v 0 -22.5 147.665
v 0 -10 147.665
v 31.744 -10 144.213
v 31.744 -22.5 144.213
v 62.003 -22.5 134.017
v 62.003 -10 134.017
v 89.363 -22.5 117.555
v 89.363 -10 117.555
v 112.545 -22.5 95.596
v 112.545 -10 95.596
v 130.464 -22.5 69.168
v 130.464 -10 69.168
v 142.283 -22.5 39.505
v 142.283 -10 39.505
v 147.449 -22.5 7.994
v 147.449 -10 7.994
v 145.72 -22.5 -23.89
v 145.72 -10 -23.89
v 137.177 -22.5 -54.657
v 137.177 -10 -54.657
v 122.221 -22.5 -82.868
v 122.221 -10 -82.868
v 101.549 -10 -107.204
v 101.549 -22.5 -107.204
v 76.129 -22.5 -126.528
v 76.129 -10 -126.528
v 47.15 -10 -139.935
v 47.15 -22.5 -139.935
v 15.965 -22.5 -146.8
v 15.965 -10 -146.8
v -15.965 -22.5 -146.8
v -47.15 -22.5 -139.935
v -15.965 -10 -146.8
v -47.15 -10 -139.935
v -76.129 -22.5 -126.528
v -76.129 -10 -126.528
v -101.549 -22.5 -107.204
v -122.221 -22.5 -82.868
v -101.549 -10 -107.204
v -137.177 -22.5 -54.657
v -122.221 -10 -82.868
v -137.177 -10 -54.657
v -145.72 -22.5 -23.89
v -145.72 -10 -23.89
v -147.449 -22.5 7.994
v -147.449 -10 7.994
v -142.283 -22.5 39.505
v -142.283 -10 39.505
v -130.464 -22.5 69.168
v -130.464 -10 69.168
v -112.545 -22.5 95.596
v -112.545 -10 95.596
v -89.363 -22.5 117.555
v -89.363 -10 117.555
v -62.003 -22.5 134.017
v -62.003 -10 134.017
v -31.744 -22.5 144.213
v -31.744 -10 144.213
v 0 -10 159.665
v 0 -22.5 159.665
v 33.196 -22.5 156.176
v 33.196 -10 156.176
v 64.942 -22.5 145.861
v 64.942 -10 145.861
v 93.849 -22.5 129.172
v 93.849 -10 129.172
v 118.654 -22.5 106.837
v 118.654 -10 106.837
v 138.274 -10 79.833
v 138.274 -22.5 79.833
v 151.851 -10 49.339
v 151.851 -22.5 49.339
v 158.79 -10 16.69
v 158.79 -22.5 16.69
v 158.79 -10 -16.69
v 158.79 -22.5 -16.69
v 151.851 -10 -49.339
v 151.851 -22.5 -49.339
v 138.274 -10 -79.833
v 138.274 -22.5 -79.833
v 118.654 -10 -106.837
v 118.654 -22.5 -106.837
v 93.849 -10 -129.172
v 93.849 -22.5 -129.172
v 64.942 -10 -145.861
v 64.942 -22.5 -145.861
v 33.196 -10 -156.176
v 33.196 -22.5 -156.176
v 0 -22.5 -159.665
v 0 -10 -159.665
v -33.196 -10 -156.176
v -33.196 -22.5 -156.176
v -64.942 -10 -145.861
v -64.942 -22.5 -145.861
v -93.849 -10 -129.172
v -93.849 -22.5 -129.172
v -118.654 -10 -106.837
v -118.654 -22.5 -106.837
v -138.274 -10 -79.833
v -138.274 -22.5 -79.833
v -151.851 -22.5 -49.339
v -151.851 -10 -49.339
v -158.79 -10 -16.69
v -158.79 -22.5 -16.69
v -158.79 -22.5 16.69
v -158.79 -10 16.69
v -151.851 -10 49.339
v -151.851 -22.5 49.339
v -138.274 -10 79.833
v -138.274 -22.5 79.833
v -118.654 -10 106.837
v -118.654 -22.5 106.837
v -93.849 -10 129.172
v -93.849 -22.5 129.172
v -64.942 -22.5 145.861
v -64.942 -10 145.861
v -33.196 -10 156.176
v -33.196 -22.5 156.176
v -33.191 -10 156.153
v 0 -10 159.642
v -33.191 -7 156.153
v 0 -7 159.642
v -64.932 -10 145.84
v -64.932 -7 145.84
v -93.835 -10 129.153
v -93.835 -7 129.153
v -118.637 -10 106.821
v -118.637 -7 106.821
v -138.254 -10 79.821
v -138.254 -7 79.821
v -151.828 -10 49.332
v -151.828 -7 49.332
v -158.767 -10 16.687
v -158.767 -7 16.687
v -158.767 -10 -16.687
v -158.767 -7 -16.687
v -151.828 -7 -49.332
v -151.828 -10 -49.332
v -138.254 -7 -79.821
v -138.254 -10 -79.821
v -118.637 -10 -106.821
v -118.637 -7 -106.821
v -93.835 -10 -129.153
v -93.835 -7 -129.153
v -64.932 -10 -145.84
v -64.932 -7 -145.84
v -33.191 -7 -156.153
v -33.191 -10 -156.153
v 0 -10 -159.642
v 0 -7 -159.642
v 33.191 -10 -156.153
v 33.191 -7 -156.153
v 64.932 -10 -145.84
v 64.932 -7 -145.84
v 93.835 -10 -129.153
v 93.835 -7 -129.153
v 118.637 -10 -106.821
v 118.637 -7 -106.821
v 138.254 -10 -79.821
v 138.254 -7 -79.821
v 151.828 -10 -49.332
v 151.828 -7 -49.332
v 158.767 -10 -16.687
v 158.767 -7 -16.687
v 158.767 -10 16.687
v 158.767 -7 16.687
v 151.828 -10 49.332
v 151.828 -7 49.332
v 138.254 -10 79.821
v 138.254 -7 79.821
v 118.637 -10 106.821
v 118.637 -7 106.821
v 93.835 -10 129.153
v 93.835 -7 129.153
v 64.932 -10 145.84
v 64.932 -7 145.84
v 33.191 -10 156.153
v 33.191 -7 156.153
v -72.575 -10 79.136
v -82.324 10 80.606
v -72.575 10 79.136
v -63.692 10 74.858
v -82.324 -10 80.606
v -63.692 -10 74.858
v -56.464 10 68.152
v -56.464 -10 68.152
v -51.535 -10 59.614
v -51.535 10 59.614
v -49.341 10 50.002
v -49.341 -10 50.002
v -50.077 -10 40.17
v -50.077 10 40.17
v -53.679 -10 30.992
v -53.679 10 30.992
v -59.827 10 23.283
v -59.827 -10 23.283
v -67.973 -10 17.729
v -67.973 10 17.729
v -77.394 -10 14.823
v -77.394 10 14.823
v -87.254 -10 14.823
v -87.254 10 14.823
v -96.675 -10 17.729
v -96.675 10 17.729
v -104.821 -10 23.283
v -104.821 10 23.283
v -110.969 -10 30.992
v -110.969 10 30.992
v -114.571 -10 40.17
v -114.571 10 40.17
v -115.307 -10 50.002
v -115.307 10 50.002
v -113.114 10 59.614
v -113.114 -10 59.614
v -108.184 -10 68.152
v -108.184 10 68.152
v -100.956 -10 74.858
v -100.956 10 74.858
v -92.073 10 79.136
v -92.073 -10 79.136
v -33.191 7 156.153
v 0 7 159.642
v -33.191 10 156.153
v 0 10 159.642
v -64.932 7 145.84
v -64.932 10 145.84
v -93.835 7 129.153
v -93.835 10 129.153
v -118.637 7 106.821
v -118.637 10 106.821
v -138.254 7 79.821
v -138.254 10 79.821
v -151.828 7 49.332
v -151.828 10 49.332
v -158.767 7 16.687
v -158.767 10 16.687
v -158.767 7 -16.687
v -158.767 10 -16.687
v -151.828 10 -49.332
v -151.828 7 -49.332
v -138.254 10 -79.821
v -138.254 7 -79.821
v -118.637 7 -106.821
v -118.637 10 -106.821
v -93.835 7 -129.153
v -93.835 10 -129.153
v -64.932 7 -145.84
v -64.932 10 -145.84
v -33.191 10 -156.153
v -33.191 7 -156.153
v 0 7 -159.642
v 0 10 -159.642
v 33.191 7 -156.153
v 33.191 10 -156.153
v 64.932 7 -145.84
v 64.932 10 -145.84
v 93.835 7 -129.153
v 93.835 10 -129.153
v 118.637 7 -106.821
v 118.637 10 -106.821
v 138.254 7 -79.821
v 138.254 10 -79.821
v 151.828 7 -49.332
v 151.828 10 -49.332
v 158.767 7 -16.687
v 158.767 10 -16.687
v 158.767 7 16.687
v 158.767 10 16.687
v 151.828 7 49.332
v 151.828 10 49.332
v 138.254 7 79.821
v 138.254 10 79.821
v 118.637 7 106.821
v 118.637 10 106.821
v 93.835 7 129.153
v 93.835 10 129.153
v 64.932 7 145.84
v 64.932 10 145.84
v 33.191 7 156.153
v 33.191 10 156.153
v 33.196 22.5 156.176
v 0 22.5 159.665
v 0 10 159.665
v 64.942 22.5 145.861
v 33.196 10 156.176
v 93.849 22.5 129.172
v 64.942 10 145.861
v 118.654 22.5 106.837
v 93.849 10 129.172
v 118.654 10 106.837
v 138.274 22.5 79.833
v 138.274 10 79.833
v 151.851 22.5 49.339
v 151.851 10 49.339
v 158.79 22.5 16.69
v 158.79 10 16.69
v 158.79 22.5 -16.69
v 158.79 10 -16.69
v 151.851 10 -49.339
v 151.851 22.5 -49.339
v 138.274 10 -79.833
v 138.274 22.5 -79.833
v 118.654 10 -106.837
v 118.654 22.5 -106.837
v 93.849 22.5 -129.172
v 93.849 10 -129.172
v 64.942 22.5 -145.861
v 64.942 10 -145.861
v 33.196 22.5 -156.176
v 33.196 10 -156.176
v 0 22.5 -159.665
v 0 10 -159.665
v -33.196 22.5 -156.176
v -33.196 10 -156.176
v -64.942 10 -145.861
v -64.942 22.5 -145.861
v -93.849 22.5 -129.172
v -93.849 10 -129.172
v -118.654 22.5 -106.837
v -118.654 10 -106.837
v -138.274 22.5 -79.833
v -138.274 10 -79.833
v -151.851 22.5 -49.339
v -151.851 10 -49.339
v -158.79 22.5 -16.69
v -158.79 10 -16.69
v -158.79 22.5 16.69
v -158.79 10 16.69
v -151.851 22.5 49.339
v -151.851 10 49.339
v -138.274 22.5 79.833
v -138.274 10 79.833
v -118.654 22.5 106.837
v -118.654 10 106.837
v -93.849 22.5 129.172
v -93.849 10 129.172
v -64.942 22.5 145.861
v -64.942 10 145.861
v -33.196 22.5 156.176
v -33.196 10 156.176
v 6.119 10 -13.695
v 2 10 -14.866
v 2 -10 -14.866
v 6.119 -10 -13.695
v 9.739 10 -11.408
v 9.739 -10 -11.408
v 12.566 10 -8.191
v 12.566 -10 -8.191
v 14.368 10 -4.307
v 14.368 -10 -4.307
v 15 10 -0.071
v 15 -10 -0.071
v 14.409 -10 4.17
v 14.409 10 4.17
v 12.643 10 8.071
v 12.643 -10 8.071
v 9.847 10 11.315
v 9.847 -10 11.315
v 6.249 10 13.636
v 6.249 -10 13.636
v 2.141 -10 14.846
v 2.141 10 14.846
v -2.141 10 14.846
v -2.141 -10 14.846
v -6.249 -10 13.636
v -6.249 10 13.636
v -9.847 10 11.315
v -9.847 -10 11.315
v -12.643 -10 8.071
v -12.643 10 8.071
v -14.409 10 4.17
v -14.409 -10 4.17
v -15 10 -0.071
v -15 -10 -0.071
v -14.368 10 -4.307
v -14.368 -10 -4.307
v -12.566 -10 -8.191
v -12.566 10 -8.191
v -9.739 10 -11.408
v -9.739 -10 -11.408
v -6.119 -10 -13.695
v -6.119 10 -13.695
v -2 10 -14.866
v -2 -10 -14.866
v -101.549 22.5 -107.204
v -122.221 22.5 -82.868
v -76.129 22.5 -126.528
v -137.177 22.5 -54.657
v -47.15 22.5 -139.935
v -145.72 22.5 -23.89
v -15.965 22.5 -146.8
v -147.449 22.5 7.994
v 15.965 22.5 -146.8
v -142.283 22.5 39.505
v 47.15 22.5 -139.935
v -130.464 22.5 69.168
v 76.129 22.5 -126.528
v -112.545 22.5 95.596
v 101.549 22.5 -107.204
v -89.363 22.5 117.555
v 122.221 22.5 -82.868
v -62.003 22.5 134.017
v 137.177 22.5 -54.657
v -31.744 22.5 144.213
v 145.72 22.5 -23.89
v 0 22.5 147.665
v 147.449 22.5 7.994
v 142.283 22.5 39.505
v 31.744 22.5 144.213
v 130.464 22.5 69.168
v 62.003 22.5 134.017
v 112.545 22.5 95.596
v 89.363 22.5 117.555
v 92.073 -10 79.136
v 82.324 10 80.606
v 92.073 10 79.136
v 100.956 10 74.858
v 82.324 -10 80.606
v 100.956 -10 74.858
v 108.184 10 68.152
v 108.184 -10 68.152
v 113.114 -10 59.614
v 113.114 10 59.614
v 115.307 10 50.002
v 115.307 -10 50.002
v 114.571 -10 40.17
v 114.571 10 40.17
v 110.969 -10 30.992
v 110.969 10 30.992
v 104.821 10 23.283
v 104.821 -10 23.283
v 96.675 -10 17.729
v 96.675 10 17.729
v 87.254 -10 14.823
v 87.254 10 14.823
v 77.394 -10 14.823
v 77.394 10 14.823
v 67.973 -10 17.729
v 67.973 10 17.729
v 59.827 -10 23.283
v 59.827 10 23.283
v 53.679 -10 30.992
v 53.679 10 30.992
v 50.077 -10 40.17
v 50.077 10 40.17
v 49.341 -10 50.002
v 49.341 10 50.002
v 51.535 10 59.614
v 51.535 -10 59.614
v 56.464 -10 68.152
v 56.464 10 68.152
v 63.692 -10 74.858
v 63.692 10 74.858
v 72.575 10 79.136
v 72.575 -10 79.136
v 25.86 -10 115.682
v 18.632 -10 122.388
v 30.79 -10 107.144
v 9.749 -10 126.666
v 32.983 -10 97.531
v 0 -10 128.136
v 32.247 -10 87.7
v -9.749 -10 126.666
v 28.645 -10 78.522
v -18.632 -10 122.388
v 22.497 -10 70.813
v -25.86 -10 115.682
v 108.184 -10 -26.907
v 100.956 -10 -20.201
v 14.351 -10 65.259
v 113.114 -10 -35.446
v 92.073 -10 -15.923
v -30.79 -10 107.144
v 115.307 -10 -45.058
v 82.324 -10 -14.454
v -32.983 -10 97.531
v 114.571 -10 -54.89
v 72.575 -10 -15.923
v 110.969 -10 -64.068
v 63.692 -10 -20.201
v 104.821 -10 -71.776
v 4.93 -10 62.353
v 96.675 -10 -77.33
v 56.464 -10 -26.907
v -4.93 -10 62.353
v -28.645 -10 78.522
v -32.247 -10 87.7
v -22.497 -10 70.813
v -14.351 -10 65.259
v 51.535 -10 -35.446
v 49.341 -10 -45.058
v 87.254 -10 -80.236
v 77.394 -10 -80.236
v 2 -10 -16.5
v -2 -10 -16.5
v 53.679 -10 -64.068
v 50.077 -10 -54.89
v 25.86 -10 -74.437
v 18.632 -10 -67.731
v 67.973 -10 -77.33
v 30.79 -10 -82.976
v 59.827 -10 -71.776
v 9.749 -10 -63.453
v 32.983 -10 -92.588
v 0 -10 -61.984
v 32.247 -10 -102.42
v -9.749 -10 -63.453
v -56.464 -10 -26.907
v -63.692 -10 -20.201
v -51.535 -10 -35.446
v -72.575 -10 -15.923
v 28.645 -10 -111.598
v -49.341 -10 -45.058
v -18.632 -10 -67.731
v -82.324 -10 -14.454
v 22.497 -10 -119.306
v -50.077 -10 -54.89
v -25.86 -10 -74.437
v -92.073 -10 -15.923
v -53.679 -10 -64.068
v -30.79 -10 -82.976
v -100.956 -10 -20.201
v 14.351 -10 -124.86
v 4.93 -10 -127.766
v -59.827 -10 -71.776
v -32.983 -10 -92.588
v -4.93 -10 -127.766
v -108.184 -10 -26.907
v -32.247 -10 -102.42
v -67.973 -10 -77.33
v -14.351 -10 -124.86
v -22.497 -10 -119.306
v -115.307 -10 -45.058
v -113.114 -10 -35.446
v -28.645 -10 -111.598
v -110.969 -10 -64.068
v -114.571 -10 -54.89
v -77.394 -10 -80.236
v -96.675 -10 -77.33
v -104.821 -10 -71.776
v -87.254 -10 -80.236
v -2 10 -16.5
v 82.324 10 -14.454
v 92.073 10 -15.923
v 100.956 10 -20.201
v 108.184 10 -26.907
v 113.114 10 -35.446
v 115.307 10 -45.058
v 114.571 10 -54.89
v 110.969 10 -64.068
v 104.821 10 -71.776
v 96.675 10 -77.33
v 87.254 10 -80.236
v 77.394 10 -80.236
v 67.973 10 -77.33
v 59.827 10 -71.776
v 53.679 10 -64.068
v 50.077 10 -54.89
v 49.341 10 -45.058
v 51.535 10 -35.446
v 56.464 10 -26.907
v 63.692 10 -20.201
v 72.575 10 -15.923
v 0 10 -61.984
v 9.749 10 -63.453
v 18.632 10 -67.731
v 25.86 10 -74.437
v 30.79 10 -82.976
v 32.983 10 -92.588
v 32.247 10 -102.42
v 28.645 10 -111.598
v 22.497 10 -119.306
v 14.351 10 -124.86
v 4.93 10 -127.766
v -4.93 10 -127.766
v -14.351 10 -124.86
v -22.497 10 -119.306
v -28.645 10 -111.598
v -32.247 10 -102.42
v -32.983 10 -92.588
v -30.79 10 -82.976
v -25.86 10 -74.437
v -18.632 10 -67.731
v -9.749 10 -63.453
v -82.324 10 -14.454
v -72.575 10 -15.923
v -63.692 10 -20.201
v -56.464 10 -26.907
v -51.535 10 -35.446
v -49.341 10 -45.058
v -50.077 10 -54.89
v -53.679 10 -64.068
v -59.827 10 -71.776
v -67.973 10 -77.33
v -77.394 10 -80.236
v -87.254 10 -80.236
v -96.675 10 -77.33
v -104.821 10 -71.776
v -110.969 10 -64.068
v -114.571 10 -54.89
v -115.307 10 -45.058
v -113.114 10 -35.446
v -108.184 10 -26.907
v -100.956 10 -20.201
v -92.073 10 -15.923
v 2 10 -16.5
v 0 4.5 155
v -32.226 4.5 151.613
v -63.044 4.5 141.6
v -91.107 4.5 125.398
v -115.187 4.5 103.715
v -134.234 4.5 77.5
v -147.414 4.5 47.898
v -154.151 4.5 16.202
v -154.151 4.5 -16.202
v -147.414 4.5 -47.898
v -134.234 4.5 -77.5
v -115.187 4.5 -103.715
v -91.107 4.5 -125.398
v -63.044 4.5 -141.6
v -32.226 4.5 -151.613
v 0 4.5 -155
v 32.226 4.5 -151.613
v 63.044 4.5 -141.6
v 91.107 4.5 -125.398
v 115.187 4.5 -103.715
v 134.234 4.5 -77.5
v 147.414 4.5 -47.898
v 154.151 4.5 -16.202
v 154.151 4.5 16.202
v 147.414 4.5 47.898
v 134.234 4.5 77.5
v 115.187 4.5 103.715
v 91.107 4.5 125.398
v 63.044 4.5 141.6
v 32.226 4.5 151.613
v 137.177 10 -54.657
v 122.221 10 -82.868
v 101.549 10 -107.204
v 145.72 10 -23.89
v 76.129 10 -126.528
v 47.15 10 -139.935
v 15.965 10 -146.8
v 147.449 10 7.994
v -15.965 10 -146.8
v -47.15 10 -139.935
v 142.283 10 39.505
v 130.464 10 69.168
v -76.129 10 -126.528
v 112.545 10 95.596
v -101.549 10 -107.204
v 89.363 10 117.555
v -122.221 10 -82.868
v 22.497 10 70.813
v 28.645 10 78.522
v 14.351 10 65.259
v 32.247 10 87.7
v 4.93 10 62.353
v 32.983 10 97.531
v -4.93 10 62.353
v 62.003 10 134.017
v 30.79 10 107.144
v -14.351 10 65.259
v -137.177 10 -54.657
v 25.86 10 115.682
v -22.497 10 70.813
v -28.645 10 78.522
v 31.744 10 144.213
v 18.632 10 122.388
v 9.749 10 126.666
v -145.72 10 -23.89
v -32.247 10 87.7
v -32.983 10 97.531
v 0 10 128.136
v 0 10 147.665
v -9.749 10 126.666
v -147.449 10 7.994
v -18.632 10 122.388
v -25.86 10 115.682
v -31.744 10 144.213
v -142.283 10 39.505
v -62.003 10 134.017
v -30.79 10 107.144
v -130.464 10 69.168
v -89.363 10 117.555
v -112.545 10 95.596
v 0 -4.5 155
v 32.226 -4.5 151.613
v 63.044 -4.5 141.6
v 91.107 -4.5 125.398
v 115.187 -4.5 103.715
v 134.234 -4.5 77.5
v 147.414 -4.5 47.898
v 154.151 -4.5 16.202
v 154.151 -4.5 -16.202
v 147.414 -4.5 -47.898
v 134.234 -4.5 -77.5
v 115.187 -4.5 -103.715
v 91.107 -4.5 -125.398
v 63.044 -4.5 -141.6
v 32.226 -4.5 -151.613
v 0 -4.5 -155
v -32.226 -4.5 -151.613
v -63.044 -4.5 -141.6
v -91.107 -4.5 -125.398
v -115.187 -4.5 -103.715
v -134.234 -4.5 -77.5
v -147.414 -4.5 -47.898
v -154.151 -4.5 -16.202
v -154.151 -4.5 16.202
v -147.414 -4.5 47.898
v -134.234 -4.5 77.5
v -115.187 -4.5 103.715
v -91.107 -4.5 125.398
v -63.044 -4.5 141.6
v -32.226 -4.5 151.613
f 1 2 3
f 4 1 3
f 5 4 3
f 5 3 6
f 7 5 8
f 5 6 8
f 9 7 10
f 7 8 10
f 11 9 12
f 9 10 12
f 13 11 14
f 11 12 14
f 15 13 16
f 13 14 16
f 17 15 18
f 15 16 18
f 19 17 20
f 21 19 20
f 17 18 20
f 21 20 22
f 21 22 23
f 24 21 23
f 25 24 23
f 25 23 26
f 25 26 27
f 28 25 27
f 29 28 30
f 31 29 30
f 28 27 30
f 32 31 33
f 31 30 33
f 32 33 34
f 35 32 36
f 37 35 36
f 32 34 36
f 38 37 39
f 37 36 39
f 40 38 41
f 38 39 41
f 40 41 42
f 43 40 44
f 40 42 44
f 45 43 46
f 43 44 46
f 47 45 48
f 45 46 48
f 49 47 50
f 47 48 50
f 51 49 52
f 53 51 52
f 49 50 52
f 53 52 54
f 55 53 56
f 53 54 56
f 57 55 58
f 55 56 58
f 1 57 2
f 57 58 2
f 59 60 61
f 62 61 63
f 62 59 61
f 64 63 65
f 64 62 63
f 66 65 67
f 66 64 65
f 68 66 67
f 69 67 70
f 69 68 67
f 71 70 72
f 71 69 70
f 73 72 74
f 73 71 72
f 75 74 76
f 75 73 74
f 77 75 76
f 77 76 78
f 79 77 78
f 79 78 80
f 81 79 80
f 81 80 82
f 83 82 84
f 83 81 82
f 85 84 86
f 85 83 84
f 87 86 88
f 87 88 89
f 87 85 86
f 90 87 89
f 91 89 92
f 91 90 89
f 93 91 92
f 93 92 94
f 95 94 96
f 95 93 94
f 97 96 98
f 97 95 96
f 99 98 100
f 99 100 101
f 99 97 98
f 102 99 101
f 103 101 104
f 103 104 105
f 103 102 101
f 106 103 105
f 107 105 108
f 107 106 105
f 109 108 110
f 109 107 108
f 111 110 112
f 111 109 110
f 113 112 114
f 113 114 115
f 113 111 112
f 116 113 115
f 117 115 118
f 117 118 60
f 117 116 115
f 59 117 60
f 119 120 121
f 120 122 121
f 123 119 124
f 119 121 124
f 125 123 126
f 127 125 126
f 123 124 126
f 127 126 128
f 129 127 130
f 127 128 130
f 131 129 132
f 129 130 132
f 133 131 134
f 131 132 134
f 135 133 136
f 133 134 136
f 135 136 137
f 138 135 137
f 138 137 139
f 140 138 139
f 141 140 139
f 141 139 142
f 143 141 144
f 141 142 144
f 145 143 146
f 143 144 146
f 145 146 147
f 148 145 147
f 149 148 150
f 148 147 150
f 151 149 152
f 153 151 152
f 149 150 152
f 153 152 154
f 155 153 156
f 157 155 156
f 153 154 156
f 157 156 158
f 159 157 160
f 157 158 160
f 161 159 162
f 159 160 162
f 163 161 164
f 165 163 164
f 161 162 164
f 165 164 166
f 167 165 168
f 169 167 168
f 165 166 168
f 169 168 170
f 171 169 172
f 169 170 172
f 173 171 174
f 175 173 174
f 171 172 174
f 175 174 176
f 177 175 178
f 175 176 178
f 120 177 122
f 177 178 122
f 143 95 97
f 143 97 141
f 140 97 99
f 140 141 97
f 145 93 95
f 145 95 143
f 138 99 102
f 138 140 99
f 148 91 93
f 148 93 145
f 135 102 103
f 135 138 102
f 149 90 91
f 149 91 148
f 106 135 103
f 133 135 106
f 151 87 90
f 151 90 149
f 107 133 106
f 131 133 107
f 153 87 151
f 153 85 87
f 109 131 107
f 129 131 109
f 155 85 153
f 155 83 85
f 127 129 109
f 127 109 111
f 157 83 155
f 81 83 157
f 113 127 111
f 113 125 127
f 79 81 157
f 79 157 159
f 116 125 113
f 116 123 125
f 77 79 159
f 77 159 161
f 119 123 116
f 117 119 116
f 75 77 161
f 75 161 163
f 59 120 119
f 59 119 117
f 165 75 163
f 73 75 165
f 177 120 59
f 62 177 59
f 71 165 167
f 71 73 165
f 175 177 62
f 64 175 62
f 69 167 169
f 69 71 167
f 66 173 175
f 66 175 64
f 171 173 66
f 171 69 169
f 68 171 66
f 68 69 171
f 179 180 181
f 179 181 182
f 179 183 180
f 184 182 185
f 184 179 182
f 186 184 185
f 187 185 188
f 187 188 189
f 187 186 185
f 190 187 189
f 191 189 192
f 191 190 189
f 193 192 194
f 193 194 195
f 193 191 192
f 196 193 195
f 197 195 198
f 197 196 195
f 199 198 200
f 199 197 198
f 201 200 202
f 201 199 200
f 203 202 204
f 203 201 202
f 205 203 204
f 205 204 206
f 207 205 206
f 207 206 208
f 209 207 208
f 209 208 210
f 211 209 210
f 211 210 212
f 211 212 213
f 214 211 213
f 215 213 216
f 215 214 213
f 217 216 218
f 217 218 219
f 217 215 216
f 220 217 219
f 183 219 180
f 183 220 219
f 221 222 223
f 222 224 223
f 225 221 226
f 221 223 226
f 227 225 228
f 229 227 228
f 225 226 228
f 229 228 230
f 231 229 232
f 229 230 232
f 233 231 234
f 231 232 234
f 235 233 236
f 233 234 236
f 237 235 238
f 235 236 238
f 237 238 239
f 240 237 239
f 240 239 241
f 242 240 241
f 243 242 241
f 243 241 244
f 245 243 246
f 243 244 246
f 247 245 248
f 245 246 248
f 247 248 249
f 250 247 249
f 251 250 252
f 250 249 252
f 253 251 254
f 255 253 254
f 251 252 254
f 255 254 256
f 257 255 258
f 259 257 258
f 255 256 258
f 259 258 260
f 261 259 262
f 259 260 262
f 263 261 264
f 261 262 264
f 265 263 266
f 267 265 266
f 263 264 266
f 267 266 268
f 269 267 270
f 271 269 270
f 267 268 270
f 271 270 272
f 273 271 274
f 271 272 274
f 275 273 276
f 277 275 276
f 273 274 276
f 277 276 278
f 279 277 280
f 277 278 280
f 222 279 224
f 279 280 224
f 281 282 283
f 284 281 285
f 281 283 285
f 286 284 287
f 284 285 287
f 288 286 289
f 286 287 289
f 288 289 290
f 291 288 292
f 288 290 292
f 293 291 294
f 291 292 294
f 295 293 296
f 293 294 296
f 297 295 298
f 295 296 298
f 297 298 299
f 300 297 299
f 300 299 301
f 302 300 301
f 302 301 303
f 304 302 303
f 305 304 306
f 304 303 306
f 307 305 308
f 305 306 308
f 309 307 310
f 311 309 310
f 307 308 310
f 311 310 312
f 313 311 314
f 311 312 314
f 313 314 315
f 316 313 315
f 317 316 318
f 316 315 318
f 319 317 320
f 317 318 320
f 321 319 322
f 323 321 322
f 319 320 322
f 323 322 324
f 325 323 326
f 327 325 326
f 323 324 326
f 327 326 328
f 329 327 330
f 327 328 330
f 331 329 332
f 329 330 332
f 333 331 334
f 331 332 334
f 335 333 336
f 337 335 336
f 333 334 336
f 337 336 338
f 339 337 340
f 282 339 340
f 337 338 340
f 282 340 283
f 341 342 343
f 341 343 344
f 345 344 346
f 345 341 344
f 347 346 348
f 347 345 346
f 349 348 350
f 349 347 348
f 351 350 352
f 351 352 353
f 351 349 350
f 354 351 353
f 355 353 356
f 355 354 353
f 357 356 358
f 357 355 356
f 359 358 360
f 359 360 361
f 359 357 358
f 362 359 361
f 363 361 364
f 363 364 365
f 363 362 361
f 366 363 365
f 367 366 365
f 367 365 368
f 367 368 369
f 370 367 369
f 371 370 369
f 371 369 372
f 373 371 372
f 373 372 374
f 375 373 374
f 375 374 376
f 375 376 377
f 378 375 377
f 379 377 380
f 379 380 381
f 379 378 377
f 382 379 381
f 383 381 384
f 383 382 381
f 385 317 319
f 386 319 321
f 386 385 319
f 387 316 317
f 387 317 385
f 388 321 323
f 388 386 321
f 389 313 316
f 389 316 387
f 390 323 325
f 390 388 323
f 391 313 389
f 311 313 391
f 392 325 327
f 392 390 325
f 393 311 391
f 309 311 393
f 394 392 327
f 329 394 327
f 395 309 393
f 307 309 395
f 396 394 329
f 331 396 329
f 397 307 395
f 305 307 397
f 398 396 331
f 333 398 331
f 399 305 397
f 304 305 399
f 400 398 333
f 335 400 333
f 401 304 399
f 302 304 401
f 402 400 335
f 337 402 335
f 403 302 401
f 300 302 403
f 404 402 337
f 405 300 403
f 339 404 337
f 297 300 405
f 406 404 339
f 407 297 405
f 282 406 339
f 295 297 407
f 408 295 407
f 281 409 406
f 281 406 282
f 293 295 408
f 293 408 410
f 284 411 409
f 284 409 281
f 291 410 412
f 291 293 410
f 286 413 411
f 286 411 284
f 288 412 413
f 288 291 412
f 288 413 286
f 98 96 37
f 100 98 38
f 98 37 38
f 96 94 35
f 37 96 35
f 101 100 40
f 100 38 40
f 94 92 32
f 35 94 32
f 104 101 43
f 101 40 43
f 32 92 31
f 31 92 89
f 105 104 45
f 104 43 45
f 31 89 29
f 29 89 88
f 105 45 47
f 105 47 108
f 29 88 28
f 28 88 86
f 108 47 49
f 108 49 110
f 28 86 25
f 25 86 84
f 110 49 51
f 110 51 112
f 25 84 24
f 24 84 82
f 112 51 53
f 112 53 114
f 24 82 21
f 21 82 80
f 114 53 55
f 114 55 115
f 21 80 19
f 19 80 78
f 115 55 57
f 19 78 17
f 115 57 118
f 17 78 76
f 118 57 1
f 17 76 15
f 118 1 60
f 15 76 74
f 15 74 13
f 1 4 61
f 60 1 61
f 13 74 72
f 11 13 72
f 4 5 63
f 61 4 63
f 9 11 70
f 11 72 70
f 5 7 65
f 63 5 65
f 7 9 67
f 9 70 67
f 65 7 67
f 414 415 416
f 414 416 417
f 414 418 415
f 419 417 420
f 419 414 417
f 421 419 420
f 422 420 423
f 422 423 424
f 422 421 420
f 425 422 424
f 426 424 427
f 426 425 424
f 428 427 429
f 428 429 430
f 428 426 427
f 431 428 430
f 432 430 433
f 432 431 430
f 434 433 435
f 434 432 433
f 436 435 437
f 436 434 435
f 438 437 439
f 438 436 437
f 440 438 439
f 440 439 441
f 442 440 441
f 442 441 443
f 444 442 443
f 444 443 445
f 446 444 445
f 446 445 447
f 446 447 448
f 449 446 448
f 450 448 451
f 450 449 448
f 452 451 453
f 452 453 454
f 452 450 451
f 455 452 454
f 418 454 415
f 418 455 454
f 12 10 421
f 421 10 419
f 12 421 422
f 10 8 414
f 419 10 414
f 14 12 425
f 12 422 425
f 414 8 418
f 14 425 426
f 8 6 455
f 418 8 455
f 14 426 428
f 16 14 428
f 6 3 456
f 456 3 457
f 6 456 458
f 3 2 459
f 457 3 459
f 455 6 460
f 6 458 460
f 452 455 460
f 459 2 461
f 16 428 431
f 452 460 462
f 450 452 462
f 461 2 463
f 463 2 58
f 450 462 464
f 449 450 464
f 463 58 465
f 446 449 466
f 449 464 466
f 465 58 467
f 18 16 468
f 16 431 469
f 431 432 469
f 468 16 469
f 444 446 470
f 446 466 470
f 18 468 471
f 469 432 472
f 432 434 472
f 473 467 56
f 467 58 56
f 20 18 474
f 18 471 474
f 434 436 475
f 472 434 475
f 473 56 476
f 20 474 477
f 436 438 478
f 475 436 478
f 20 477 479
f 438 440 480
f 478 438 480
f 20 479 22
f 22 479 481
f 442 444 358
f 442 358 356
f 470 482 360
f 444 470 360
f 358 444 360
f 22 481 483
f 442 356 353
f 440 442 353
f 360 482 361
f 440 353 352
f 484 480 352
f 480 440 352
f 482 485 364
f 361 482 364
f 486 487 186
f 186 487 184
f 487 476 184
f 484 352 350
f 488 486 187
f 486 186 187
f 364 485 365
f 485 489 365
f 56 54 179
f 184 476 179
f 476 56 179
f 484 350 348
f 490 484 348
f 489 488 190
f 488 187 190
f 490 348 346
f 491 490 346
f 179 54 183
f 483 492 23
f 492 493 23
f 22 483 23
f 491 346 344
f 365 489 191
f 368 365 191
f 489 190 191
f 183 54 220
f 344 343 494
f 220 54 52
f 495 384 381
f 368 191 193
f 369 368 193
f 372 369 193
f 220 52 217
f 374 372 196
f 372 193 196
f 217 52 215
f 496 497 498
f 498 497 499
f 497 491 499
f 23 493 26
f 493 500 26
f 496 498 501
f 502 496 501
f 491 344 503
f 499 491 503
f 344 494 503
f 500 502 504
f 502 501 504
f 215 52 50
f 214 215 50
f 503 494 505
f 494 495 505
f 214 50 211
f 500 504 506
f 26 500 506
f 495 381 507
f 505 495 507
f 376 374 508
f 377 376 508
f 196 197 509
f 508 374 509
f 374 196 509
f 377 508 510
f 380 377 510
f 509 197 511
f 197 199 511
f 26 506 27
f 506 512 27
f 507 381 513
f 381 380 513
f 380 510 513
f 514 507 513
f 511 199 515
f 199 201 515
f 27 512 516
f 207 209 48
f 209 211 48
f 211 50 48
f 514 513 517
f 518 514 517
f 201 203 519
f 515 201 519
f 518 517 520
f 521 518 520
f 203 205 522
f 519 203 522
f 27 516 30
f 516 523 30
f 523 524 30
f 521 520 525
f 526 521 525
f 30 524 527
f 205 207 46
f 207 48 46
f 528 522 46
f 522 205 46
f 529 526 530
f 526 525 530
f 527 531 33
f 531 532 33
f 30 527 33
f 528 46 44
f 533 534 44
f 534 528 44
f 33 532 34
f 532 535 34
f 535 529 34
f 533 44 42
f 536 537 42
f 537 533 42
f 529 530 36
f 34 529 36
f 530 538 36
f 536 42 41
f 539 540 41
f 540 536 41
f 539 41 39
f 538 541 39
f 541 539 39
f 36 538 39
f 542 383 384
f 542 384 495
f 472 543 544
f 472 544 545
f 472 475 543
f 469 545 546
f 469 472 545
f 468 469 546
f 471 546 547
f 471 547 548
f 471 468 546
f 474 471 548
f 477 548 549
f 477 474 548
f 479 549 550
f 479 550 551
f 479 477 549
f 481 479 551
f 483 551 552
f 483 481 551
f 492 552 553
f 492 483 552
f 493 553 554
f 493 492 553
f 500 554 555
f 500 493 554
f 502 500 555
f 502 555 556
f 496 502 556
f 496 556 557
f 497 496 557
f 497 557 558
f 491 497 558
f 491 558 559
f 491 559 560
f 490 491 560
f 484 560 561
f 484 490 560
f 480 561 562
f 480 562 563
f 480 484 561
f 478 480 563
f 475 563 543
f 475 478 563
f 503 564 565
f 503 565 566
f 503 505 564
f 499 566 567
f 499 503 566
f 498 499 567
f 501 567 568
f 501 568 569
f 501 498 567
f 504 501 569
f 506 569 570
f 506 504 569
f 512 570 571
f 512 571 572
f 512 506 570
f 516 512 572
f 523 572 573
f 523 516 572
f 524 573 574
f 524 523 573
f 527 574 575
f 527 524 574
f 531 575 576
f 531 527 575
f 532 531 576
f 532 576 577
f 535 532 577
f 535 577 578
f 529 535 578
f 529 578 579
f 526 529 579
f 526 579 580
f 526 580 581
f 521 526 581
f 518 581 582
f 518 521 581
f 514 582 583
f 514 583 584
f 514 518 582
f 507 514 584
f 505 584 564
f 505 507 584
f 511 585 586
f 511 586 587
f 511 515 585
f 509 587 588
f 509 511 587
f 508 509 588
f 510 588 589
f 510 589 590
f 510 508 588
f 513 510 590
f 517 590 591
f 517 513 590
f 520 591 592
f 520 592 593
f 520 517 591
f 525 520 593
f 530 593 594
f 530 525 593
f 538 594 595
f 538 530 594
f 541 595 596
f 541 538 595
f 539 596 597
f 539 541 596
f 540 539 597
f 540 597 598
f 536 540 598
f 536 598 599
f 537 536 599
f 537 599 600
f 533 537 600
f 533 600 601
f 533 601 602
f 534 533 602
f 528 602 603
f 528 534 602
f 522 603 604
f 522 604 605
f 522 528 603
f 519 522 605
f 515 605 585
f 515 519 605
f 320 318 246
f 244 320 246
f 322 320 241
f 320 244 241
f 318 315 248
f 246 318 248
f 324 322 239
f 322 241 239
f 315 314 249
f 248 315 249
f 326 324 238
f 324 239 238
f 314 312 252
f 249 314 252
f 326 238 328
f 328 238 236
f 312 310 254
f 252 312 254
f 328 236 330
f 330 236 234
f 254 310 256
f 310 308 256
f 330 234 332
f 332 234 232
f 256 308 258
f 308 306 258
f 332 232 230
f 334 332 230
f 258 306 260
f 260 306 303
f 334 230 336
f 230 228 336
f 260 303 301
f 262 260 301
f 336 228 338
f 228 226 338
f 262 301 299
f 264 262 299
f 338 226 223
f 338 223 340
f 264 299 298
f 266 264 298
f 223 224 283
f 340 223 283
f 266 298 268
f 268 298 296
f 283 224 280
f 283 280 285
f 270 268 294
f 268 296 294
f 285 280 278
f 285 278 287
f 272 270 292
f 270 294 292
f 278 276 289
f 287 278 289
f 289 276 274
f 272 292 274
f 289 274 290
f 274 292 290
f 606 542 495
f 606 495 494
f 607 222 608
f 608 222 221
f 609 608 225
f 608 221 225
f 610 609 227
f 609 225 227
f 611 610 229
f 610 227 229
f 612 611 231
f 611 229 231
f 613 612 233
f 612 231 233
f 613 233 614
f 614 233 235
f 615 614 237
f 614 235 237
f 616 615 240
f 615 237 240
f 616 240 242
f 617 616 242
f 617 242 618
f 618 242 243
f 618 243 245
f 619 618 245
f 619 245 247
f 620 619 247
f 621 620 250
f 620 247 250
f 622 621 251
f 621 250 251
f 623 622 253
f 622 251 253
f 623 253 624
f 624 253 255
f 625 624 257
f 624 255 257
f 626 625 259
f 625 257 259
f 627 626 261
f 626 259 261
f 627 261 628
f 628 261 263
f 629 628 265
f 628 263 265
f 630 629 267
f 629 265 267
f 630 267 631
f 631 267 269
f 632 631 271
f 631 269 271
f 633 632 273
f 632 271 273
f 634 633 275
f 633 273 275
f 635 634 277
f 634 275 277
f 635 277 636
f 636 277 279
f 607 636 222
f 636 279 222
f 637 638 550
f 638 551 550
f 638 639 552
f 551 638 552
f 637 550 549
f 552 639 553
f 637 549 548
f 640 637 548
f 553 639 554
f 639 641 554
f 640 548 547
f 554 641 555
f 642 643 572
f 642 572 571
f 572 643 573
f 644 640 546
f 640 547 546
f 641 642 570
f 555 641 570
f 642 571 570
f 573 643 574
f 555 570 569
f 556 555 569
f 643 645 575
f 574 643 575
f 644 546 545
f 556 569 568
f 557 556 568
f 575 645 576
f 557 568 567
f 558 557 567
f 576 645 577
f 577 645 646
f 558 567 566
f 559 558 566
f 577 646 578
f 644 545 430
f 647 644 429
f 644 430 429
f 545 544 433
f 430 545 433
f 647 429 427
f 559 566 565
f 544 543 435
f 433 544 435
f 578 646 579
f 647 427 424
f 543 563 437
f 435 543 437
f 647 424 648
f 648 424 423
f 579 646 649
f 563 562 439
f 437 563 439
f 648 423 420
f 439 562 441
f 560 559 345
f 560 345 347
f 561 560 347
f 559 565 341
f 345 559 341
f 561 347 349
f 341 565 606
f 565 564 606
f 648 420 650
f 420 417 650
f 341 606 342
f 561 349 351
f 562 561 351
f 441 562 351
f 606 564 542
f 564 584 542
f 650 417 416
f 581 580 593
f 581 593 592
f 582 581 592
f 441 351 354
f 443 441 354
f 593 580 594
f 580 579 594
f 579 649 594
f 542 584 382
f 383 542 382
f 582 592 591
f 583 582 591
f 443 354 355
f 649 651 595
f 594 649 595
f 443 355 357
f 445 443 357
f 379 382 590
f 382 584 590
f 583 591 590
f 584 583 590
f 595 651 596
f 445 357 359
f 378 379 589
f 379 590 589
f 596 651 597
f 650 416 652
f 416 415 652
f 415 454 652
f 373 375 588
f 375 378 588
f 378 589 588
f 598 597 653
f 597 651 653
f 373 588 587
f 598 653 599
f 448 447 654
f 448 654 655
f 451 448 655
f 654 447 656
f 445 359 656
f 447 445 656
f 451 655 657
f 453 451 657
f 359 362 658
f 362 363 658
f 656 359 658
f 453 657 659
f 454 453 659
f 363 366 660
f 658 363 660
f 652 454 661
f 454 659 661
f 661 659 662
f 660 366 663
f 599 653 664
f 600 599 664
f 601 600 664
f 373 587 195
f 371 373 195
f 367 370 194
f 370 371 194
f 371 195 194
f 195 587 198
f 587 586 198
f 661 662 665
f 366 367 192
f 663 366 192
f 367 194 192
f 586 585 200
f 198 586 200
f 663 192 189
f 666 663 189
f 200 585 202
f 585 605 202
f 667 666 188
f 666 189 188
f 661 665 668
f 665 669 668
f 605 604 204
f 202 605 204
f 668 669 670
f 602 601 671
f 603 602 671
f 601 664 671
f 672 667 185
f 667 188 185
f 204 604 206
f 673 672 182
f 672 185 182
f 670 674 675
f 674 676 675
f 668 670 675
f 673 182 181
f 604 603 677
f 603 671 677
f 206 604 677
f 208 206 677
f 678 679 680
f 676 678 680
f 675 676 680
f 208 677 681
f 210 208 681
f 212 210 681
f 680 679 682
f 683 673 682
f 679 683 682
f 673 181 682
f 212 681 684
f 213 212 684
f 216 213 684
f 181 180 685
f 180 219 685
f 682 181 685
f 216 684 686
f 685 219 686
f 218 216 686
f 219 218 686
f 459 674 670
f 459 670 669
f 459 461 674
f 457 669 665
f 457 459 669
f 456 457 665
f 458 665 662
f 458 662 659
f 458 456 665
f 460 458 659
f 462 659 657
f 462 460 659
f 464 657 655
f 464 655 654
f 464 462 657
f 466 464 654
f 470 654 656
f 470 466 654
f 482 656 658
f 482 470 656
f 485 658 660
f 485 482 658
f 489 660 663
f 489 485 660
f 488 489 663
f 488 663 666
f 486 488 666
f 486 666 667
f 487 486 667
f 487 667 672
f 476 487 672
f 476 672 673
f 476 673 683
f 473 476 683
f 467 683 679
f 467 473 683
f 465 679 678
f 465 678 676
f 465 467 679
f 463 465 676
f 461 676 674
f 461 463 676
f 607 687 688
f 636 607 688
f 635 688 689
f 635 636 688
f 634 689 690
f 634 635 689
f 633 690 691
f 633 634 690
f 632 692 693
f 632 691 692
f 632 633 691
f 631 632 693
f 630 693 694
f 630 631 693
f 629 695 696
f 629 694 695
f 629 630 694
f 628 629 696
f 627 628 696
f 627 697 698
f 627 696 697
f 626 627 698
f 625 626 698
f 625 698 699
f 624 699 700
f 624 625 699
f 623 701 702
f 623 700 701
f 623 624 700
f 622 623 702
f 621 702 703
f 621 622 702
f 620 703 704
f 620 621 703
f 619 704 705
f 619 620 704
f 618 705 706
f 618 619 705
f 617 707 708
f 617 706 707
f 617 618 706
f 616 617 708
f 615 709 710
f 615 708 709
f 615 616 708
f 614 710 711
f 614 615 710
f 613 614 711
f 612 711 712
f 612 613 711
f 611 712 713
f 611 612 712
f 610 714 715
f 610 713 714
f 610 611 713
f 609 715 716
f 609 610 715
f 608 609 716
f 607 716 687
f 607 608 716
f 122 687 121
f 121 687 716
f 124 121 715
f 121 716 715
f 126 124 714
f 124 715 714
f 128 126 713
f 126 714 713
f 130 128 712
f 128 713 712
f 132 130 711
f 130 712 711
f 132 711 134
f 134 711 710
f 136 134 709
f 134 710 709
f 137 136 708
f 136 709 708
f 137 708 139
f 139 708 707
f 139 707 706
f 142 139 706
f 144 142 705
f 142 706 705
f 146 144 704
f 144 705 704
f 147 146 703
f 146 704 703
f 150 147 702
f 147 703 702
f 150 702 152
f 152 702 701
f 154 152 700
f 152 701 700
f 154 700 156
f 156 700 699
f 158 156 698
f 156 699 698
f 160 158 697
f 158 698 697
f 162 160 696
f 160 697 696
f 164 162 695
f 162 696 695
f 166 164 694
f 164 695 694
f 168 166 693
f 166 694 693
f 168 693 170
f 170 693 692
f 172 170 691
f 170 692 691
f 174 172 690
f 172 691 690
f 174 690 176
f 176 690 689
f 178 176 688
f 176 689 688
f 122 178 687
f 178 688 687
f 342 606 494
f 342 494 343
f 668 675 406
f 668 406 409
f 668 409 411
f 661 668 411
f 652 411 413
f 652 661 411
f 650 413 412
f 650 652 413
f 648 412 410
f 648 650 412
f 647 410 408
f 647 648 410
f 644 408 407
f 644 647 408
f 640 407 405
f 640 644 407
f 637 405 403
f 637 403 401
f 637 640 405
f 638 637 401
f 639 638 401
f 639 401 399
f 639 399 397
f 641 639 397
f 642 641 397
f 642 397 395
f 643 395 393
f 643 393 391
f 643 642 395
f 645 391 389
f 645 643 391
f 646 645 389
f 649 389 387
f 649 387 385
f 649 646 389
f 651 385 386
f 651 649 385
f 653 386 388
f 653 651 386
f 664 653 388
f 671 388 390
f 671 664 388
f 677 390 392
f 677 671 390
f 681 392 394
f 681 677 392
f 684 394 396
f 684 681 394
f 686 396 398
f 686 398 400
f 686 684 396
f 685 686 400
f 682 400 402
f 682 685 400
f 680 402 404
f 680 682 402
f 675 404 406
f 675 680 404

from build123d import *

# Parameters (mm, degrees)
CROQUIS1_R              = 155
CROQUIS1_R_2            = 33.0759403
SALIENTE_EXTRUIR1_DEPTH = 10
CROQUIS3_R              = 159.665159843
CROQUIS3_R_2            = 147.665159843
SALIENTE_EXTRUIR2_DEPTH = 12.5


with BuildPart() as part:
    # Croquis1 → Saliente-Extruir1 (new, symmetric)
    with BuildSketch(Plane(origin=(0, 0, 0), x_dir=(1, 0, 0), z_dir=(0, 1, 0))):
        with Locations(Location((0, 0, 0), (0, 0, 270))):
            Circle(CROQUIS1_R)
        with Locations(Location((0, 95.059598075, 0), (0, 0, 270))):
            Circle(CROQUIS1_R_2, mode=Mode.SUBTRACT)
        with Locations(Location((82.324026806, 47.529799037, 0), (0, 0, 270))):
            Circle(CROQUIS1_R_2, mode=Mode.SUBTRACT)
        with Locations(Location((82.324026806, -47.529799037, 0), (0, 0, 270))):
            Circle(CROQUIS1_R_2, mode=Mode.SUBTRACT)
        with Locations(Location((0, -95.059598075, 0), (0, 0, 270))):
            Circle(CROQUIS1_R_2, mode=Mode.SUBTRACT)
        with Locations(Location((-82.324026806, -47.529799037, 0), (0, 0, 270))):
            Circle(CROQUIS1_R_2, mode=Mode.SUBTRACT)
        with Locations(Location((-82.324026806, 47.529799037, 0), (0, 0, 270))):
            Circle(CROQUIS1_R_2, mode=Mode.SUBTRACT)
        with BuildLine():
            Line((-2, 16.5), (2, 16.5))
            Line((2, 16.5), (2, 14.866068747))
            ThreePointArc((2, 14.866068747), (0, -15), (-2, 14.866068747))
            Line((-2, 14.866068747), (-2, 16.5))
        make_face(mode=Mode.SUBTRACT)
    extrude(amount=SALIENTE_EXTRUIR1_DEPTH, both=True)

    # Croquis2 → Revolución1 (revolve)
    with BuildSketch(Plane(origin=(0, 0, 0), x_dir=(0, 0, -1), z_dir=(1, 0, 0)), mode=Mode.PRIVATE) as revoluci_n1_sk:
        Polygon((155, 10), (155, 4.5), (159.641767411, 7), (159.641767411, 10), align=None)
        Polygon((155, -4.5), (155, -10), (159.641767411, -10), (159.641767411, -7), align=None)
    revolve(revoluci_n1_sk.sketch.rotate(Axis((0, 10, 0), (0, -1, 0)), 180), axis=Axis((0, 10, 0), (0, -1, 0)))

    # Croquis3 → Saliente-Extruir2 (add)
    with BuildSketch(Plane(origin=(0, 10, 0), x_dir=(1, 0, 0), z_dir=(0, 1, 0))):
        with Locations(Location((0, 0, 0), (0, 0, 270))):
            Circle(CROQUIS3_R)
        with Locations(Location((0, 0, 0), (0, 0, 270))):
            Circle(CROQUIS3_R_2, mode=Mode.SUBTRACT)
    saliente_extruir2 = extrude(amount=SALIENTE_EXTRUIR2_DEPTH)

    # Simetría1: Saliente-Extruir2 across plane
    add(saliente_extruir2.mirror(Plane.ZX))


solid = part.part
